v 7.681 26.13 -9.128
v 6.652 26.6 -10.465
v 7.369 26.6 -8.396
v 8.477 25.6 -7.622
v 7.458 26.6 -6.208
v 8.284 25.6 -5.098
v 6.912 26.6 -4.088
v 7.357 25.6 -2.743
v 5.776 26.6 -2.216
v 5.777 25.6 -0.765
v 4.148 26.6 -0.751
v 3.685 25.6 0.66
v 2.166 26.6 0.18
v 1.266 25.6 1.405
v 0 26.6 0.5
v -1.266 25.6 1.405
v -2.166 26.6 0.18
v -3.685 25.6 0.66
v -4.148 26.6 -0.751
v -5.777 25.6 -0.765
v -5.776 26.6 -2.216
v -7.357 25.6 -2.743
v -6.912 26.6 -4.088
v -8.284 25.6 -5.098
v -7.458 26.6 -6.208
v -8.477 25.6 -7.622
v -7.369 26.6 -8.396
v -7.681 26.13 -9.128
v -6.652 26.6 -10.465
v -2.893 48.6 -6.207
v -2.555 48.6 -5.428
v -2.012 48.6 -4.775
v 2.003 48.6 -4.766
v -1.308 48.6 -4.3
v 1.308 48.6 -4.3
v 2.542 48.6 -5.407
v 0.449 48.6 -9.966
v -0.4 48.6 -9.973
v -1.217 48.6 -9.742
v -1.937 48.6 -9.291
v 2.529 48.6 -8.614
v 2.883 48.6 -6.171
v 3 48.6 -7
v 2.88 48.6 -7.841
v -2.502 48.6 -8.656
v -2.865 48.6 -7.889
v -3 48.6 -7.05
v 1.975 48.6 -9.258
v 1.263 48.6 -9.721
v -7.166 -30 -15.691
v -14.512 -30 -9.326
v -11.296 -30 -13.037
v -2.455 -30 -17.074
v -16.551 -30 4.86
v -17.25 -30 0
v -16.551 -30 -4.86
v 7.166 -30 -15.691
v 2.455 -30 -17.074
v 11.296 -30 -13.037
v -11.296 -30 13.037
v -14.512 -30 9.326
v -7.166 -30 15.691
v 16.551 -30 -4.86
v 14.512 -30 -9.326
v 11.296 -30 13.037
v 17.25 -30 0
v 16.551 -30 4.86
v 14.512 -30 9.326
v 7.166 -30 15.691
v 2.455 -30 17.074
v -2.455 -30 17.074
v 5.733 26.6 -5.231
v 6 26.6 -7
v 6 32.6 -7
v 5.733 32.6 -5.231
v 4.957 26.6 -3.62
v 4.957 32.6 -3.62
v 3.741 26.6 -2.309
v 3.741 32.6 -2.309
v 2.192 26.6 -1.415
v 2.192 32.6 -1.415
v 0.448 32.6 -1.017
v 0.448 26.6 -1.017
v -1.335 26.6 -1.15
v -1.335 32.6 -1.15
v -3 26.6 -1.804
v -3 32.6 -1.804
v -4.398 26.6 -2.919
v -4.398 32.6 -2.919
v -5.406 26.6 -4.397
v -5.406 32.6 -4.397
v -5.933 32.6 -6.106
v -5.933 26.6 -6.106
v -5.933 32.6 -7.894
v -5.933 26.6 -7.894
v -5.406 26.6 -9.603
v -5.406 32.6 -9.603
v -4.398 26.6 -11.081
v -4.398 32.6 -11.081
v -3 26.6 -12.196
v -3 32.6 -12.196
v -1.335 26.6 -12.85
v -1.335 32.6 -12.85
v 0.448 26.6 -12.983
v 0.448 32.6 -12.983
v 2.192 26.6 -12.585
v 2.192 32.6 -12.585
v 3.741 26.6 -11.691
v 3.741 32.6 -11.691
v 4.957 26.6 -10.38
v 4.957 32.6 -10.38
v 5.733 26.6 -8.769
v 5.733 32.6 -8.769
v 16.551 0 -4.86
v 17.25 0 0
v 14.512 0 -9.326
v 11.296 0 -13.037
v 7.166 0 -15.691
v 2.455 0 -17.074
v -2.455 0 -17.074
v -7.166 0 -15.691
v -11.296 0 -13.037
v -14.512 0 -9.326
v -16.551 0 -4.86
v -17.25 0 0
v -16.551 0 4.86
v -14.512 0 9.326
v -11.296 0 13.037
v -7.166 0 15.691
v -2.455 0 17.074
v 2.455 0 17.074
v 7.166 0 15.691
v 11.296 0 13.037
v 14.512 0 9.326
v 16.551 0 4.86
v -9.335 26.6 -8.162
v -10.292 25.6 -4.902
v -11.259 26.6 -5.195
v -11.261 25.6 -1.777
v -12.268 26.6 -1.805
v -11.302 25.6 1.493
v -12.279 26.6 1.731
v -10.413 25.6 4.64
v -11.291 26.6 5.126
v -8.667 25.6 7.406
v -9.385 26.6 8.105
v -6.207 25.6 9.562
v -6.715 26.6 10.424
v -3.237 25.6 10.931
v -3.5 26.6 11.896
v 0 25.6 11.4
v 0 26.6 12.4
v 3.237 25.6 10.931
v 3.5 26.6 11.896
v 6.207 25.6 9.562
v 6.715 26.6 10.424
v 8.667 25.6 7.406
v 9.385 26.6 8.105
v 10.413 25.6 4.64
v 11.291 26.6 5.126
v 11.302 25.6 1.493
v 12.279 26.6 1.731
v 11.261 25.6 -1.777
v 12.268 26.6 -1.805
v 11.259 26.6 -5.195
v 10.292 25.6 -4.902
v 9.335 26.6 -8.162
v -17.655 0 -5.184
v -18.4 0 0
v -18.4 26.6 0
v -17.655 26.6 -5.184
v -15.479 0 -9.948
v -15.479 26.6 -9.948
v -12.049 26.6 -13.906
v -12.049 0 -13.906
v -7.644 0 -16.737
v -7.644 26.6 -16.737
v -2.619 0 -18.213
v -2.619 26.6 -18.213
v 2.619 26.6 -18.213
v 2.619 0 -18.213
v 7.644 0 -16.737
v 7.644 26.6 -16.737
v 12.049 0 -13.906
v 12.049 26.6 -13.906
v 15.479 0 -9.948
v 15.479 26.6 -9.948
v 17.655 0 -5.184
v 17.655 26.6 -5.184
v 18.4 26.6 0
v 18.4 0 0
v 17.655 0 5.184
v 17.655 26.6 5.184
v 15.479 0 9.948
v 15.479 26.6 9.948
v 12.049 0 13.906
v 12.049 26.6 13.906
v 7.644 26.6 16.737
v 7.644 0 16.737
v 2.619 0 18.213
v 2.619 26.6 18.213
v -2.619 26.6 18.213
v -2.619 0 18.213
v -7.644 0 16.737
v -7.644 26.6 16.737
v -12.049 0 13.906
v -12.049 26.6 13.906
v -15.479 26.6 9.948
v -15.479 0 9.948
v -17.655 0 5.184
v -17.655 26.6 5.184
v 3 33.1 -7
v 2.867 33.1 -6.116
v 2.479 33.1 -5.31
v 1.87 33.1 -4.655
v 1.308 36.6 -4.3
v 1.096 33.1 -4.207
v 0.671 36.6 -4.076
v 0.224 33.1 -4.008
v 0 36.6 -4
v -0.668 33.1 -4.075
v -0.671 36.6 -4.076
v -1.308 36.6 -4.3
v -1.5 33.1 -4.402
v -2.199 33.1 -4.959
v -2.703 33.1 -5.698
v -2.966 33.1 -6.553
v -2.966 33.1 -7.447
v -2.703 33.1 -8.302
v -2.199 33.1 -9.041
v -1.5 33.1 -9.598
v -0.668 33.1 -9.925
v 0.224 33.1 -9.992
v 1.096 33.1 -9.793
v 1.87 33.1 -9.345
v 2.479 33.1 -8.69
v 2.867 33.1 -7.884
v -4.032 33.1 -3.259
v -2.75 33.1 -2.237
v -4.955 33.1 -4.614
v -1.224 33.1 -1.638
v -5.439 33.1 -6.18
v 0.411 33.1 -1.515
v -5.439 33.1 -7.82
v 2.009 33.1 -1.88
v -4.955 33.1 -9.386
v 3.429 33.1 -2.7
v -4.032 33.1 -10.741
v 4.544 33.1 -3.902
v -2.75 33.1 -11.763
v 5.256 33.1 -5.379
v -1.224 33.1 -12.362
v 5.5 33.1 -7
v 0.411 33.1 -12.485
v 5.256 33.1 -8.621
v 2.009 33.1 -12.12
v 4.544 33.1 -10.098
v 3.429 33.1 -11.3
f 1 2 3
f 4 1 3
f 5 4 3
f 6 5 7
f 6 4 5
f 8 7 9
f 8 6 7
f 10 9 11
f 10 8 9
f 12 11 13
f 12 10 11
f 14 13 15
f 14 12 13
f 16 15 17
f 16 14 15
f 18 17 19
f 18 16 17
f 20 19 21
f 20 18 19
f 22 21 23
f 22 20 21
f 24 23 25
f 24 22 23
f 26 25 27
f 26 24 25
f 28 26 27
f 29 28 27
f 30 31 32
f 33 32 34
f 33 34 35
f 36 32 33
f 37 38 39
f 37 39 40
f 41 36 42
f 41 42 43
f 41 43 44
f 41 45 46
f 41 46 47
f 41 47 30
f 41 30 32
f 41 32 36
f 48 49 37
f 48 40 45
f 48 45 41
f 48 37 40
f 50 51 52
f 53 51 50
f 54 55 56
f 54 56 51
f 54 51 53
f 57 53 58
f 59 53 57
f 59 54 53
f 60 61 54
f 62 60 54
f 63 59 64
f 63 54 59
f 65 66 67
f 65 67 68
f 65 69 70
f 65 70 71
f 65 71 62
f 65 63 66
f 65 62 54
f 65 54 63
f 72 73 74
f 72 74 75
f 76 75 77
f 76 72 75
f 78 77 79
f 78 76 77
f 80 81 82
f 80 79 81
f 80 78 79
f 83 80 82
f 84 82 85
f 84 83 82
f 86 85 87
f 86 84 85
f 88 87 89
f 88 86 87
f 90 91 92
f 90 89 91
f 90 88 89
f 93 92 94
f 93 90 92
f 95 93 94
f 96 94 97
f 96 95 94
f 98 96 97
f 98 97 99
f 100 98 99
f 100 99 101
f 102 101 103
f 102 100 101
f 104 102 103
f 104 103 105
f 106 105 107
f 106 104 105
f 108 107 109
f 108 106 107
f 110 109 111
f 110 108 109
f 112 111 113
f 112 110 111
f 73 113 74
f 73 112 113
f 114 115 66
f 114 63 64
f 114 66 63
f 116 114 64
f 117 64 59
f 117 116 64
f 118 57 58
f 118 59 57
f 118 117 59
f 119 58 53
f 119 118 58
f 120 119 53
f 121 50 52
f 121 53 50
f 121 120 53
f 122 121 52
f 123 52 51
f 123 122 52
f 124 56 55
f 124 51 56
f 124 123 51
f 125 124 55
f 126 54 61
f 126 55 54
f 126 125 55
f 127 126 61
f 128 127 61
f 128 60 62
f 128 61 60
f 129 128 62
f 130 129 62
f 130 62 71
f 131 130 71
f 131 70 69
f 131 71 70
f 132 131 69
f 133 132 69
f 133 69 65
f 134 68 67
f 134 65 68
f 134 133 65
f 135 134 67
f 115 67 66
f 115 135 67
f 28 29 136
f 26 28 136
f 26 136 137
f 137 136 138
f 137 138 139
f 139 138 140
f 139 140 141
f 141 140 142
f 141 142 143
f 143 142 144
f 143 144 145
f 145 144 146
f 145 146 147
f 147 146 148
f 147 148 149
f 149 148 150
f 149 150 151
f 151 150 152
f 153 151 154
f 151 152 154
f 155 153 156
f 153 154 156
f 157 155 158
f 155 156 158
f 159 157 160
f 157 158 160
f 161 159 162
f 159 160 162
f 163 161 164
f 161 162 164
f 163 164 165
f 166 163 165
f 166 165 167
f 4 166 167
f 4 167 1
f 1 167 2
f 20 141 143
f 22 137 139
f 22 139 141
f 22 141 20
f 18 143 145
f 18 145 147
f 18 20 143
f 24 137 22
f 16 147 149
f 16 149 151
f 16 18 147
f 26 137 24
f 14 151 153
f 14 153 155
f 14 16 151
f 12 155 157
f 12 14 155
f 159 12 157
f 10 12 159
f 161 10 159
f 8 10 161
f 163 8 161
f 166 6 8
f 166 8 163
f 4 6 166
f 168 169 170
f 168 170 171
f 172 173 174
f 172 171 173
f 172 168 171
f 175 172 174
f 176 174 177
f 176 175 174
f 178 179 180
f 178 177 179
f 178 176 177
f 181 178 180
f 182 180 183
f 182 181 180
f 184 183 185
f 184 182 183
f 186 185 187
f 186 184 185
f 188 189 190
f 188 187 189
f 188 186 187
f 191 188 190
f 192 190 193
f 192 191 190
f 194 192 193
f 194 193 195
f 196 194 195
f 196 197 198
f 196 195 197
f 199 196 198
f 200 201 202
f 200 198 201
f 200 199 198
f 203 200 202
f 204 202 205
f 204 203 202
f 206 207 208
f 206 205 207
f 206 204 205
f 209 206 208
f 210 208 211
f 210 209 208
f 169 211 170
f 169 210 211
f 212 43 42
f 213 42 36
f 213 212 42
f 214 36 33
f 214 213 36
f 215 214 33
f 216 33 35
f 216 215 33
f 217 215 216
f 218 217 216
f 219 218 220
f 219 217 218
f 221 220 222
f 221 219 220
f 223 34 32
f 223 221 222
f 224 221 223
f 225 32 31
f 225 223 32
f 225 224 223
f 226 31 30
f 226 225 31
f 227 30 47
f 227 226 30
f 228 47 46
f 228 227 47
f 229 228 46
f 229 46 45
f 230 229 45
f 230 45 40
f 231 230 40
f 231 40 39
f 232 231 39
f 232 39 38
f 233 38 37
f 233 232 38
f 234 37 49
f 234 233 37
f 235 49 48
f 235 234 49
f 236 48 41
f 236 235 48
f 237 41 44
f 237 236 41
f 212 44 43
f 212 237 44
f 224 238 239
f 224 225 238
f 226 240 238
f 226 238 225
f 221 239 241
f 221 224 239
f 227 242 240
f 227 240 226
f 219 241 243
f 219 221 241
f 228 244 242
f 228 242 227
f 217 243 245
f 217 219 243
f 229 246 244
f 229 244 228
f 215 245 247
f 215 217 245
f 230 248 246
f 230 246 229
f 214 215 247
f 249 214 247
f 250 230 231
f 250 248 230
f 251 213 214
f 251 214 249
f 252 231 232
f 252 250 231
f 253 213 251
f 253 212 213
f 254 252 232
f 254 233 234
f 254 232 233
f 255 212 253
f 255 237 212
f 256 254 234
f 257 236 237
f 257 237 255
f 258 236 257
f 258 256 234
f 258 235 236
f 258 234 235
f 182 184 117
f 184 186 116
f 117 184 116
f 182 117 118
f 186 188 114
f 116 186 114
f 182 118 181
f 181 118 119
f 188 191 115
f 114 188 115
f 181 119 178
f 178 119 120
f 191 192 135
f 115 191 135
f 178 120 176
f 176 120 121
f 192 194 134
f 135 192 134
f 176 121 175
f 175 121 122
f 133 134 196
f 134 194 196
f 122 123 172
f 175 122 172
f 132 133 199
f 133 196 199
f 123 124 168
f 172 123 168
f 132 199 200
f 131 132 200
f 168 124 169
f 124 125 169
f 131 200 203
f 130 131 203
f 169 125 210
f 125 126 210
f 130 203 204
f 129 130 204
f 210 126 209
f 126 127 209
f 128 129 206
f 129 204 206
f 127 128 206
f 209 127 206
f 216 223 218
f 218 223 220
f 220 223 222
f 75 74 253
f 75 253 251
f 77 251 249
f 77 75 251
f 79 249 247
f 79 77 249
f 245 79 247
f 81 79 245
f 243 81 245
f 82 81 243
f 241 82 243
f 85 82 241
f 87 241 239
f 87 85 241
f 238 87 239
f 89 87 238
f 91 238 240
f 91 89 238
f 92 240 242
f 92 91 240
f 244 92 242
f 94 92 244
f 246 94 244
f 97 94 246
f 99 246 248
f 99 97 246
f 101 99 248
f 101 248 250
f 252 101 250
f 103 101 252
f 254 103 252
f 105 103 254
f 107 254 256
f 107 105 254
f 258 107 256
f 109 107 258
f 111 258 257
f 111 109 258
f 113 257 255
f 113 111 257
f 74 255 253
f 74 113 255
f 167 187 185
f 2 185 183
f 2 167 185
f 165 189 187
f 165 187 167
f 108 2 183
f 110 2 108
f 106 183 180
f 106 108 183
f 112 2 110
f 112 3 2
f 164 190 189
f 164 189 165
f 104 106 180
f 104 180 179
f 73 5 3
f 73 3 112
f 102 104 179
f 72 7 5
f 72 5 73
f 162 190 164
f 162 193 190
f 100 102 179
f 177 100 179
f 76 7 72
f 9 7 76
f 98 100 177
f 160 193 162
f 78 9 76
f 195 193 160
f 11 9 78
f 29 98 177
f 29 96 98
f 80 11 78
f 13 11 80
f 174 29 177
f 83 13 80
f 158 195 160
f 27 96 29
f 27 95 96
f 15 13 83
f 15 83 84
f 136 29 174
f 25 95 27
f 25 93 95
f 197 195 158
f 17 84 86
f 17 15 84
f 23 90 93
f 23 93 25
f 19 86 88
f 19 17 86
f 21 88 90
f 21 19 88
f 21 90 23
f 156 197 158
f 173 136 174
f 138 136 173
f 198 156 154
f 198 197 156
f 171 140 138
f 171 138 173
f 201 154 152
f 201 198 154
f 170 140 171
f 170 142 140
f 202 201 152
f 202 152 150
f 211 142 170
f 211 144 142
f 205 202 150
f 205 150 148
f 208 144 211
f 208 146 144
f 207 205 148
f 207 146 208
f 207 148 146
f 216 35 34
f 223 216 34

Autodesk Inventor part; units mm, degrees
ref_plane "YZ Plane" through (0, 0, 0) normal (1, 0, 0) x (0, 1, 0)
ref_plane "XZ Plane" through (0, 0, 0) normal (0, 1, 0) x (-1, 0, 0)
ref_plane "XY Plane" through (0, 0, 0) normal (0, 0, 1) x (1, 0, 0)
sketch "Sketch1" plane through (0, 0, 0) normal (0, 1, 0) x (-1, 0, 0)
  circle A0 centre (0, 0) radius 18.4
  dimension "d0" = 36.8
sketch "Sketch1 outline for Extrusion1" plane through (0, 0, 0) normal (0, 1, 0) x (-1, 0, 0)
  circle A0 centre (0, 0) radius 18.4
extrude "Extrusion1" add sketch "Sketch1 outline for Extrusion1" along normal blind 26.6
sketch "Sketch2" plane through (0, 26.6, 0) normal (0, 1, 0) x (1, 0, 0)
  circle A0 centre (0, 7) radius 6
  point P0 (0, 0)
  dimension "d5" = 0
  dimension "d6" = 7
  dimension "d7" = 12
sketch "Sketch2 outline for Extrusion2" plane through (0, 26.6, 0) normal (0, 1, 0) x (1, 0, 0)
  circle A0 centre (0, 7) radius 6
extrude "Extrusion2" add sketch "Sketch2 outline for Extrusion2" along normal blind 6.5
chamfer "Chamfer1" distance 0.5 angle 45 1 edges at (-6, 33.1, -7)
sketch "Sketch3" plane through (0, 26.6, 0) normal (0, 1, 0) x (1, 0, 0)
  circle A0 centre (0, 0) radius 18.4
  circle A1 centre (0, 0) radius 18.4
  arc A2 (-8.477201, 7.622143) -> (8.477201, 7.622143) centre (0, 7) ccw
  arc A3 (-8.477201, 7.622143) -> (8.477201, 7.622143) centre (0, 0) ccw
  dimension "d13" = 0
  dimension "d14" = 7
  dimension "d15" = 17
  dimension "d16" = 22.8
sketch "Sketch3 outline for Extrusion3" plane through (0, 26.6, 0) normal (0, 1, 0) x (1, 0, 0)
  arc A0 (-8.477201, 7.622143) -> (8.477201, 7.622143) centre (0, 0) ccw
  arc A1 (8.477201, 7.622143) -> (-8.477201, 7.622143) centre (0, 7) cw
extrude "Extrusion3" cut sketch "Sketch3 outline for Extrusion3" against normal blind 1
chamfer "Chamfer3" distance 1 angle 45 2 edges at (0, 26.6, 11.4) (0, 26.6, 1.5)
sketch "Sketch4" plane through (0, 33.1, -7) normal (0, 1, 0) x (1, 0, 0)
  circle A0 centre (0, 0) radius 3
  circle A1 centre (0, 0) radius 6 projected
  point P0 (0, -7)
  dimension "d25" = 6
sketch "Sketch4 outline for Extrusion4" plane through (0, 33.1, -7) normal (0, 1, 0) x (1, 0, 0)
  circle A0 centre (0, 0) radius 3
extrude "Extrusion4" add sketch "Sketch4 outline for Extrusion4" along normal blind 15.5
sketch "Sketch5" plane through (0, 48.6, -7) normal (0, 1, 0) x (1, 0, 0)
  line L0 (0, -2.7) -> (-1.30767, -2.7)
  line L1 (0, -2.7) -> (1.30767, -2.7)
  circle A0 centre (0, 0) radius 3
  arc A1 (-1.30767, -2.7) -> (1.30767, -2.7) centre (0, 0) ccw
  point P0 (0, -7)
  dimension "d33" = 4.3
sketch "Sketch5 outline for Extrusion5" plane through (0, 48.6, -7) normal (0, 1, 0) x (1, 0, 0)
  line L0 (1.30767, -2.7) -> (0, -2.7)
  arc A0 (-1.30767, -2.7) -> (1.30767, -2.7) centre (0, 0) ccw
  line L1 (0, -2.7) -> (-1.30767, -2.7)
extrude "Extrusion5" cut sketch "Sketch5 outline for Extrusion5" against normal blind 12
sketch "Sketch6" plane through (0, 0, 0) normal (0, -1, 0) x (1, 0, 0)
  circle A0 centre (0, 0) radius 17.25
  dimension "d36" = 34.5
sketch "Sketch6 outline for Extrusion6" plane through (0, 0, 0) normal (0, -1, 0) x (1, 0, 0)
  circle A0 centre (0, 0) radius 17.25
extrude "Extrusion6" add sketch "Sketch6 outline for Extrusion6" along normal blind 30
properties part number "37D mm metal gearmotor"
